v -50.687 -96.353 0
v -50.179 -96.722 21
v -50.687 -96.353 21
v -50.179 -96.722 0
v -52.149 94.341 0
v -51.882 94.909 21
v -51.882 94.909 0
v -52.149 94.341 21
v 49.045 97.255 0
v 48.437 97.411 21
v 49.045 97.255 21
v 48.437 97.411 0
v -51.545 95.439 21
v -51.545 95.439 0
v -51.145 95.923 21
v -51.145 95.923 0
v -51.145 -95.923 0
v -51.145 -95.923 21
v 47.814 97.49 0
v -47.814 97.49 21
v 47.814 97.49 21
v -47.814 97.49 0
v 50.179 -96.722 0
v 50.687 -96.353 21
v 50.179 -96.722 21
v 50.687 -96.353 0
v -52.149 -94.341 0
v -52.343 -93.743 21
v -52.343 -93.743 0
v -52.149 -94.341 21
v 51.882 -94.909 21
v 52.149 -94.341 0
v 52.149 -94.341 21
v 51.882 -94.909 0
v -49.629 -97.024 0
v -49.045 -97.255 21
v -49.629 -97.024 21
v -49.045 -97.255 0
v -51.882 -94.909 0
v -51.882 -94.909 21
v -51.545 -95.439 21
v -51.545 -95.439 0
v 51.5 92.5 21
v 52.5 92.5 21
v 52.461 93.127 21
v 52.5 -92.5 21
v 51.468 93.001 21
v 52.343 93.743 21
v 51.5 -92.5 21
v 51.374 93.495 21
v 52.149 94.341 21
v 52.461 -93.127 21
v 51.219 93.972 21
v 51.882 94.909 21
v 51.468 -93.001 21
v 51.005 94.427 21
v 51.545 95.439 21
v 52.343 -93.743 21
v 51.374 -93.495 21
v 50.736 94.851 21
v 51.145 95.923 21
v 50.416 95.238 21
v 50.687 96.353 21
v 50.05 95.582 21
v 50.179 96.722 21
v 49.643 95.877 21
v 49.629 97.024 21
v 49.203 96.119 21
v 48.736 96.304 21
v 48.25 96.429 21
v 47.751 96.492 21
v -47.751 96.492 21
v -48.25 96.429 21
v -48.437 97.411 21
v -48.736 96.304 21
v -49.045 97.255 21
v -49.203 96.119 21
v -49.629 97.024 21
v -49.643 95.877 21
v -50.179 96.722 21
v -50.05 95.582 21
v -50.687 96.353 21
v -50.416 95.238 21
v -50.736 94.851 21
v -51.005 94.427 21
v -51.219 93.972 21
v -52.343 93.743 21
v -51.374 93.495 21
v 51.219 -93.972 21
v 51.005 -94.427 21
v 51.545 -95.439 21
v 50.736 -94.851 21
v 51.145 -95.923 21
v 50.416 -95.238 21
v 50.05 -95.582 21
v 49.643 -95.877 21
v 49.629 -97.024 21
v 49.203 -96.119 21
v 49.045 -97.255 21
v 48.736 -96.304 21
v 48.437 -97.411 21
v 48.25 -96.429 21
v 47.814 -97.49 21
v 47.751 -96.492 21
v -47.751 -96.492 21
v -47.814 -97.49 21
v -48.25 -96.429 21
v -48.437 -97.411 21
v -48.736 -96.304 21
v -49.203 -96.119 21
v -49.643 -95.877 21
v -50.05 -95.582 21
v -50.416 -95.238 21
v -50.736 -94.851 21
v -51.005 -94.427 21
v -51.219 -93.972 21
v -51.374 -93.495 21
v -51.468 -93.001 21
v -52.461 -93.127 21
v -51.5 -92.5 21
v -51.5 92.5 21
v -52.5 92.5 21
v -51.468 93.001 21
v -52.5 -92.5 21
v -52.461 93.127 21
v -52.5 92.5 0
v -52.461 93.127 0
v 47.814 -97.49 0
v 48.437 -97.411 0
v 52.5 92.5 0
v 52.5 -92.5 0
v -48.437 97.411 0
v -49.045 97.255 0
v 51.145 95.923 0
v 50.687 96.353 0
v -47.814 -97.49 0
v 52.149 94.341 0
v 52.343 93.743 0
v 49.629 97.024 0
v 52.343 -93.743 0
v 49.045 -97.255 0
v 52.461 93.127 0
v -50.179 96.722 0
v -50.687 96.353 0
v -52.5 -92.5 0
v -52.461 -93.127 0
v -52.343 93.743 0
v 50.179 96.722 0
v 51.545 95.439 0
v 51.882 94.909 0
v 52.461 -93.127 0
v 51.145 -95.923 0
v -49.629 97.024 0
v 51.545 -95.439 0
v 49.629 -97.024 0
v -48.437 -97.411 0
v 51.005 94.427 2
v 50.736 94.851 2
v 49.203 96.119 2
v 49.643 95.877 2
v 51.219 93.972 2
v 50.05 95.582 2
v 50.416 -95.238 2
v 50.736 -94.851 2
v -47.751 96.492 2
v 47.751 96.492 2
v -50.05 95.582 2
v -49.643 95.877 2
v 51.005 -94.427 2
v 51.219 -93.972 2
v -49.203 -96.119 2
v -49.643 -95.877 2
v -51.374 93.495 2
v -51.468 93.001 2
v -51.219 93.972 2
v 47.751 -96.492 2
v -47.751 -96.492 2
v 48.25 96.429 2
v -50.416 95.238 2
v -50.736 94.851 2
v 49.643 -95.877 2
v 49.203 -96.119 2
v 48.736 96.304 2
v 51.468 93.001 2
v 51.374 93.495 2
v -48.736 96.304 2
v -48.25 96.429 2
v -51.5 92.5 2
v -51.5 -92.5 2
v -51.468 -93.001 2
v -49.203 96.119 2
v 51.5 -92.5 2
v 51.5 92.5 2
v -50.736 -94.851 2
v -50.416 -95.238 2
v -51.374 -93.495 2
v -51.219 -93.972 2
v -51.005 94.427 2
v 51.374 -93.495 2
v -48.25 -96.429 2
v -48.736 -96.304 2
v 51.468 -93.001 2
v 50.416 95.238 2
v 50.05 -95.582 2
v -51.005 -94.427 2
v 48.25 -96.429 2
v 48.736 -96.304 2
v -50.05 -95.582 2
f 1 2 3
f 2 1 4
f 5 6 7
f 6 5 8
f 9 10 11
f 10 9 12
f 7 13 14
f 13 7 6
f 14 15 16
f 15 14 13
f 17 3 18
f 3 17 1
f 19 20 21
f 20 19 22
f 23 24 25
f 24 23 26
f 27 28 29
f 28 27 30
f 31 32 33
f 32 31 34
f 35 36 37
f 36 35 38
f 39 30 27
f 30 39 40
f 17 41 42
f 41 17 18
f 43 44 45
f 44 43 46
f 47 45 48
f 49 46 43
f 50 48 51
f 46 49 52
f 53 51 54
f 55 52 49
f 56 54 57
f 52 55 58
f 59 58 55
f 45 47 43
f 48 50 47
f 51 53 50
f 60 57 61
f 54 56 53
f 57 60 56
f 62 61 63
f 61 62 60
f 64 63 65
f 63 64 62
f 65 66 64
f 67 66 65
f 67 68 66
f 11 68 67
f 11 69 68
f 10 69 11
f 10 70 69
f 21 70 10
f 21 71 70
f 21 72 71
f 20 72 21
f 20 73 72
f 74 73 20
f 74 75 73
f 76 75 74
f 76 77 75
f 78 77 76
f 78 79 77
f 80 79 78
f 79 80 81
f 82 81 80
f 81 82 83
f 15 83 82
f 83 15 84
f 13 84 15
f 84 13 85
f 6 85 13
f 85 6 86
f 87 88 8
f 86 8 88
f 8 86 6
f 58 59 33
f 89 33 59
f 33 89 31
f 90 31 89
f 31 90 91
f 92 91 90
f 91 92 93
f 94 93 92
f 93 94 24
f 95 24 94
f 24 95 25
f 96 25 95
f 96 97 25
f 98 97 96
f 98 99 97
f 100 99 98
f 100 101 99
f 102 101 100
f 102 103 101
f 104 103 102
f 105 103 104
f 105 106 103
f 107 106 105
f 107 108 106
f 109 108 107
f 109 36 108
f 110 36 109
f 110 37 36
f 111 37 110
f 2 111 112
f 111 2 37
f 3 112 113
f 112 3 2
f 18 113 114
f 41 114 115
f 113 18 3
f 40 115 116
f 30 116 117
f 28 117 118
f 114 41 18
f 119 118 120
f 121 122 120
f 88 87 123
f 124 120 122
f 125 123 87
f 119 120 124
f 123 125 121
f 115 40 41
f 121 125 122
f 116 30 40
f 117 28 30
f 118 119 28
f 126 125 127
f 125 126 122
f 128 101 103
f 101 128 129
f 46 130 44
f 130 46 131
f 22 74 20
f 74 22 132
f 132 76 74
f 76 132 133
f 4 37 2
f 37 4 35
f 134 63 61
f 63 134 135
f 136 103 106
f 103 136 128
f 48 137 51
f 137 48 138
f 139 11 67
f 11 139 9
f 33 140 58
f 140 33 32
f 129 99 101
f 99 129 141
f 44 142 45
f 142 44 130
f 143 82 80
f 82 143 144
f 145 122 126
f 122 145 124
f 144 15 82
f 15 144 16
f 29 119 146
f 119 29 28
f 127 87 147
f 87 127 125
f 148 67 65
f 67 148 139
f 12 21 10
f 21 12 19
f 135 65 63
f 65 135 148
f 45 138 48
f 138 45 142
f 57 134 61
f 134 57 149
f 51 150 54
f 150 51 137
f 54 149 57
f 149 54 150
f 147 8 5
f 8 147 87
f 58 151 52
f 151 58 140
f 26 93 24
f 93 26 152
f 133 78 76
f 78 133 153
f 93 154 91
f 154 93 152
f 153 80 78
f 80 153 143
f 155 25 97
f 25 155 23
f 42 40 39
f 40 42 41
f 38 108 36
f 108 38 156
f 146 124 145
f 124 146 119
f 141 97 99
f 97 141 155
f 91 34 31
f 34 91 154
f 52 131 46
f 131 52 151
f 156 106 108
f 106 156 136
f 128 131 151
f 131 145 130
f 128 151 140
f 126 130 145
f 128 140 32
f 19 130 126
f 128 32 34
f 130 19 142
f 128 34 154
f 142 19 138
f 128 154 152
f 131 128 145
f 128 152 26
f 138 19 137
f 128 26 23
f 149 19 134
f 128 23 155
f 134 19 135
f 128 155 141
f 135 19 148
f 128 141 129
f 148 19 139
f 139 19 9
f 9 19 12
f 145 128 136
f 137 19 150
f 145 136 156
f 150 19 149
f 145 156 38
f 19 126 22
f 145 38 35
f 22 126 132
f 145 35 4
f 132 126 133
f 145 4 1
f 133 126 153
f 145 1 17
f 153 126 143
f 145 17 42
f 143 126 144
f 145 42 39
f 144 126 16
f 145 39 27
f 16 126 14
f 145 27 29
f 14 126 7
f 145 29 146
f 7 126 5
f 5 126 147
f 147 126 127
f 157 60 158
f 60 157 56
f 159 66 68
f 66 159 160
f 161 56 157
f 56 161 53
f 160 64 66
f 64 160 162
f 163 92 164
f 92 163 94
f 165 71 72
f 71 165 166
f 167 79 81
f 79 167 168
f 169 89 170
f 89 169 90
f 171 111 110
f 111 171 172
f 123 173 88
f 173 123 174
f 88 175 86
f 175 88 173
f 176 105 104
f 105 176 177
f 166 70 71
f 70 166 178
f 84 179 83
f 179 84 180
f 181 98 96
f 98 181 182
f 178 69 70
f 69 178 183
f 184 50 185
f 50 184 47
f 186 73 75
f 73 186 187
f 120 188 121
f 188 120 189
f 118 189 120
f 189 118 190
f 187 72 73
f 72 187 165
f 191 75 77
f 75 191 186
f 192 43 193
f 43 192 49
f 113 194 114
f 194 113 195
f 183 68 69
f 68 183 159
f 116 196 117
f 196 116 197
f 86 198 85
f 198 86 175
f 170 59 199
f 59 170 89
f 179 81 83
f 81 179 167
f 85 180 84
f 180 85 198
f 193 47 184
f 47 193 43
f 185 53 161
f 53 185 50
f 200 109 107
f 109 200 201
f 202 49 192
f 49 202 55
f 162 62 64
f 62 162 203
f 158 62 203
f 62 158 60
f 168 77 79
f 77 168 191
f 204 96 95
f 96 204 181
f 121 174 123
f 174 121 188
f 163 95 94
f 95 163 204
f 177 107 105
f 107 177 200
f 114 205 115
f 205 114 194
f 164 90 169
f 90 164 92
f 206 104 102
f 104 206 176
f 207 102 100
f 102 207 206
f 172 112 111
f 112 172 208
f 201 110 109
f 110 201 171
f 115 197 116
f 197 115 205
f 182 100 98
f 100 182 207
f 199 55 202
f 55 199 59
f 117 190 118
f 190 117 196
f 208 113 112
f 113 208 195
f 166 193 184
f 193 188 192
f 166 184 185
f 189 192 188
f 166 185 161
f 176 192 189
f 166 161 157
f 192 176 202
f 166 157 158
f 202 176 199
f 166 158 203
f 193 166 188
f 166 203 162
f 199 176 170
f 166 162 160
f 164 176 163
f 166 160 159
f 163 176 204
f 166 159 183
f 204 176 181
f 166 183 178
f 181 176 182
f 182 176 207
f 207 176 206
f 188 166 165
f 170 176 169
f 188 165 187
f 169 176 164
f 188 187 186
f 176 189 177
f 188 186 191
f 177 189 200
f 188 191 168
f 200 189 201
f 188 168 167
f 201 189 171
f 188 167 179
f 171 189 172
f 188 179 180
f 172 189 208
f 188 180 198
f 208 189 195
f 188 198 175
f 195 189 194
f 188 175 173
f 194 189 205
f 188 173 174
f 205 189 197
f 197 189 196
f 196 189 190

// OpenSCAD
$fn = 50;


difference() {
	union() {
		hull() {
			translate(v = [-47.5000000000, 92.5000000000, 0]) {
				cylinder(h = 21, r = 5);
			}
			translate(v = [47.5000000000, 92.5000000000, 0]) {
				cylinder(h = 21, r = 5);
			}
			translate(v = [-47.5000000000, -92.5000000000, 0]) {
				cylinder(h = 21, r = 5);
			}
			translate(v = [47.5000000000, -92.5000000000, 0]) {
				cylinder(h = 21, r = 5);
			}
		}
	}
	union() {
		translate(v = [0, 0, 2]) {
			hull() {
				translate(v = [-47.5000000000, 92.5000000000, 0]) {
					cylinder(h = 19, r = 4);
				}
				translate(v = [47.5000000000, 92.5000000000, 0]) {
					cylinder(h = 19, r = 4);
				}
				translate(v = [-47.5000000000, -92.5000000000, 0]) {
					cylinder(h = 19, r = 4);
				}
				translate(v = [47.5000000000, -92.5000000000, 0]) {
					cylinder(h = 19, r = 4);
				}
			}
		}
	}
}
